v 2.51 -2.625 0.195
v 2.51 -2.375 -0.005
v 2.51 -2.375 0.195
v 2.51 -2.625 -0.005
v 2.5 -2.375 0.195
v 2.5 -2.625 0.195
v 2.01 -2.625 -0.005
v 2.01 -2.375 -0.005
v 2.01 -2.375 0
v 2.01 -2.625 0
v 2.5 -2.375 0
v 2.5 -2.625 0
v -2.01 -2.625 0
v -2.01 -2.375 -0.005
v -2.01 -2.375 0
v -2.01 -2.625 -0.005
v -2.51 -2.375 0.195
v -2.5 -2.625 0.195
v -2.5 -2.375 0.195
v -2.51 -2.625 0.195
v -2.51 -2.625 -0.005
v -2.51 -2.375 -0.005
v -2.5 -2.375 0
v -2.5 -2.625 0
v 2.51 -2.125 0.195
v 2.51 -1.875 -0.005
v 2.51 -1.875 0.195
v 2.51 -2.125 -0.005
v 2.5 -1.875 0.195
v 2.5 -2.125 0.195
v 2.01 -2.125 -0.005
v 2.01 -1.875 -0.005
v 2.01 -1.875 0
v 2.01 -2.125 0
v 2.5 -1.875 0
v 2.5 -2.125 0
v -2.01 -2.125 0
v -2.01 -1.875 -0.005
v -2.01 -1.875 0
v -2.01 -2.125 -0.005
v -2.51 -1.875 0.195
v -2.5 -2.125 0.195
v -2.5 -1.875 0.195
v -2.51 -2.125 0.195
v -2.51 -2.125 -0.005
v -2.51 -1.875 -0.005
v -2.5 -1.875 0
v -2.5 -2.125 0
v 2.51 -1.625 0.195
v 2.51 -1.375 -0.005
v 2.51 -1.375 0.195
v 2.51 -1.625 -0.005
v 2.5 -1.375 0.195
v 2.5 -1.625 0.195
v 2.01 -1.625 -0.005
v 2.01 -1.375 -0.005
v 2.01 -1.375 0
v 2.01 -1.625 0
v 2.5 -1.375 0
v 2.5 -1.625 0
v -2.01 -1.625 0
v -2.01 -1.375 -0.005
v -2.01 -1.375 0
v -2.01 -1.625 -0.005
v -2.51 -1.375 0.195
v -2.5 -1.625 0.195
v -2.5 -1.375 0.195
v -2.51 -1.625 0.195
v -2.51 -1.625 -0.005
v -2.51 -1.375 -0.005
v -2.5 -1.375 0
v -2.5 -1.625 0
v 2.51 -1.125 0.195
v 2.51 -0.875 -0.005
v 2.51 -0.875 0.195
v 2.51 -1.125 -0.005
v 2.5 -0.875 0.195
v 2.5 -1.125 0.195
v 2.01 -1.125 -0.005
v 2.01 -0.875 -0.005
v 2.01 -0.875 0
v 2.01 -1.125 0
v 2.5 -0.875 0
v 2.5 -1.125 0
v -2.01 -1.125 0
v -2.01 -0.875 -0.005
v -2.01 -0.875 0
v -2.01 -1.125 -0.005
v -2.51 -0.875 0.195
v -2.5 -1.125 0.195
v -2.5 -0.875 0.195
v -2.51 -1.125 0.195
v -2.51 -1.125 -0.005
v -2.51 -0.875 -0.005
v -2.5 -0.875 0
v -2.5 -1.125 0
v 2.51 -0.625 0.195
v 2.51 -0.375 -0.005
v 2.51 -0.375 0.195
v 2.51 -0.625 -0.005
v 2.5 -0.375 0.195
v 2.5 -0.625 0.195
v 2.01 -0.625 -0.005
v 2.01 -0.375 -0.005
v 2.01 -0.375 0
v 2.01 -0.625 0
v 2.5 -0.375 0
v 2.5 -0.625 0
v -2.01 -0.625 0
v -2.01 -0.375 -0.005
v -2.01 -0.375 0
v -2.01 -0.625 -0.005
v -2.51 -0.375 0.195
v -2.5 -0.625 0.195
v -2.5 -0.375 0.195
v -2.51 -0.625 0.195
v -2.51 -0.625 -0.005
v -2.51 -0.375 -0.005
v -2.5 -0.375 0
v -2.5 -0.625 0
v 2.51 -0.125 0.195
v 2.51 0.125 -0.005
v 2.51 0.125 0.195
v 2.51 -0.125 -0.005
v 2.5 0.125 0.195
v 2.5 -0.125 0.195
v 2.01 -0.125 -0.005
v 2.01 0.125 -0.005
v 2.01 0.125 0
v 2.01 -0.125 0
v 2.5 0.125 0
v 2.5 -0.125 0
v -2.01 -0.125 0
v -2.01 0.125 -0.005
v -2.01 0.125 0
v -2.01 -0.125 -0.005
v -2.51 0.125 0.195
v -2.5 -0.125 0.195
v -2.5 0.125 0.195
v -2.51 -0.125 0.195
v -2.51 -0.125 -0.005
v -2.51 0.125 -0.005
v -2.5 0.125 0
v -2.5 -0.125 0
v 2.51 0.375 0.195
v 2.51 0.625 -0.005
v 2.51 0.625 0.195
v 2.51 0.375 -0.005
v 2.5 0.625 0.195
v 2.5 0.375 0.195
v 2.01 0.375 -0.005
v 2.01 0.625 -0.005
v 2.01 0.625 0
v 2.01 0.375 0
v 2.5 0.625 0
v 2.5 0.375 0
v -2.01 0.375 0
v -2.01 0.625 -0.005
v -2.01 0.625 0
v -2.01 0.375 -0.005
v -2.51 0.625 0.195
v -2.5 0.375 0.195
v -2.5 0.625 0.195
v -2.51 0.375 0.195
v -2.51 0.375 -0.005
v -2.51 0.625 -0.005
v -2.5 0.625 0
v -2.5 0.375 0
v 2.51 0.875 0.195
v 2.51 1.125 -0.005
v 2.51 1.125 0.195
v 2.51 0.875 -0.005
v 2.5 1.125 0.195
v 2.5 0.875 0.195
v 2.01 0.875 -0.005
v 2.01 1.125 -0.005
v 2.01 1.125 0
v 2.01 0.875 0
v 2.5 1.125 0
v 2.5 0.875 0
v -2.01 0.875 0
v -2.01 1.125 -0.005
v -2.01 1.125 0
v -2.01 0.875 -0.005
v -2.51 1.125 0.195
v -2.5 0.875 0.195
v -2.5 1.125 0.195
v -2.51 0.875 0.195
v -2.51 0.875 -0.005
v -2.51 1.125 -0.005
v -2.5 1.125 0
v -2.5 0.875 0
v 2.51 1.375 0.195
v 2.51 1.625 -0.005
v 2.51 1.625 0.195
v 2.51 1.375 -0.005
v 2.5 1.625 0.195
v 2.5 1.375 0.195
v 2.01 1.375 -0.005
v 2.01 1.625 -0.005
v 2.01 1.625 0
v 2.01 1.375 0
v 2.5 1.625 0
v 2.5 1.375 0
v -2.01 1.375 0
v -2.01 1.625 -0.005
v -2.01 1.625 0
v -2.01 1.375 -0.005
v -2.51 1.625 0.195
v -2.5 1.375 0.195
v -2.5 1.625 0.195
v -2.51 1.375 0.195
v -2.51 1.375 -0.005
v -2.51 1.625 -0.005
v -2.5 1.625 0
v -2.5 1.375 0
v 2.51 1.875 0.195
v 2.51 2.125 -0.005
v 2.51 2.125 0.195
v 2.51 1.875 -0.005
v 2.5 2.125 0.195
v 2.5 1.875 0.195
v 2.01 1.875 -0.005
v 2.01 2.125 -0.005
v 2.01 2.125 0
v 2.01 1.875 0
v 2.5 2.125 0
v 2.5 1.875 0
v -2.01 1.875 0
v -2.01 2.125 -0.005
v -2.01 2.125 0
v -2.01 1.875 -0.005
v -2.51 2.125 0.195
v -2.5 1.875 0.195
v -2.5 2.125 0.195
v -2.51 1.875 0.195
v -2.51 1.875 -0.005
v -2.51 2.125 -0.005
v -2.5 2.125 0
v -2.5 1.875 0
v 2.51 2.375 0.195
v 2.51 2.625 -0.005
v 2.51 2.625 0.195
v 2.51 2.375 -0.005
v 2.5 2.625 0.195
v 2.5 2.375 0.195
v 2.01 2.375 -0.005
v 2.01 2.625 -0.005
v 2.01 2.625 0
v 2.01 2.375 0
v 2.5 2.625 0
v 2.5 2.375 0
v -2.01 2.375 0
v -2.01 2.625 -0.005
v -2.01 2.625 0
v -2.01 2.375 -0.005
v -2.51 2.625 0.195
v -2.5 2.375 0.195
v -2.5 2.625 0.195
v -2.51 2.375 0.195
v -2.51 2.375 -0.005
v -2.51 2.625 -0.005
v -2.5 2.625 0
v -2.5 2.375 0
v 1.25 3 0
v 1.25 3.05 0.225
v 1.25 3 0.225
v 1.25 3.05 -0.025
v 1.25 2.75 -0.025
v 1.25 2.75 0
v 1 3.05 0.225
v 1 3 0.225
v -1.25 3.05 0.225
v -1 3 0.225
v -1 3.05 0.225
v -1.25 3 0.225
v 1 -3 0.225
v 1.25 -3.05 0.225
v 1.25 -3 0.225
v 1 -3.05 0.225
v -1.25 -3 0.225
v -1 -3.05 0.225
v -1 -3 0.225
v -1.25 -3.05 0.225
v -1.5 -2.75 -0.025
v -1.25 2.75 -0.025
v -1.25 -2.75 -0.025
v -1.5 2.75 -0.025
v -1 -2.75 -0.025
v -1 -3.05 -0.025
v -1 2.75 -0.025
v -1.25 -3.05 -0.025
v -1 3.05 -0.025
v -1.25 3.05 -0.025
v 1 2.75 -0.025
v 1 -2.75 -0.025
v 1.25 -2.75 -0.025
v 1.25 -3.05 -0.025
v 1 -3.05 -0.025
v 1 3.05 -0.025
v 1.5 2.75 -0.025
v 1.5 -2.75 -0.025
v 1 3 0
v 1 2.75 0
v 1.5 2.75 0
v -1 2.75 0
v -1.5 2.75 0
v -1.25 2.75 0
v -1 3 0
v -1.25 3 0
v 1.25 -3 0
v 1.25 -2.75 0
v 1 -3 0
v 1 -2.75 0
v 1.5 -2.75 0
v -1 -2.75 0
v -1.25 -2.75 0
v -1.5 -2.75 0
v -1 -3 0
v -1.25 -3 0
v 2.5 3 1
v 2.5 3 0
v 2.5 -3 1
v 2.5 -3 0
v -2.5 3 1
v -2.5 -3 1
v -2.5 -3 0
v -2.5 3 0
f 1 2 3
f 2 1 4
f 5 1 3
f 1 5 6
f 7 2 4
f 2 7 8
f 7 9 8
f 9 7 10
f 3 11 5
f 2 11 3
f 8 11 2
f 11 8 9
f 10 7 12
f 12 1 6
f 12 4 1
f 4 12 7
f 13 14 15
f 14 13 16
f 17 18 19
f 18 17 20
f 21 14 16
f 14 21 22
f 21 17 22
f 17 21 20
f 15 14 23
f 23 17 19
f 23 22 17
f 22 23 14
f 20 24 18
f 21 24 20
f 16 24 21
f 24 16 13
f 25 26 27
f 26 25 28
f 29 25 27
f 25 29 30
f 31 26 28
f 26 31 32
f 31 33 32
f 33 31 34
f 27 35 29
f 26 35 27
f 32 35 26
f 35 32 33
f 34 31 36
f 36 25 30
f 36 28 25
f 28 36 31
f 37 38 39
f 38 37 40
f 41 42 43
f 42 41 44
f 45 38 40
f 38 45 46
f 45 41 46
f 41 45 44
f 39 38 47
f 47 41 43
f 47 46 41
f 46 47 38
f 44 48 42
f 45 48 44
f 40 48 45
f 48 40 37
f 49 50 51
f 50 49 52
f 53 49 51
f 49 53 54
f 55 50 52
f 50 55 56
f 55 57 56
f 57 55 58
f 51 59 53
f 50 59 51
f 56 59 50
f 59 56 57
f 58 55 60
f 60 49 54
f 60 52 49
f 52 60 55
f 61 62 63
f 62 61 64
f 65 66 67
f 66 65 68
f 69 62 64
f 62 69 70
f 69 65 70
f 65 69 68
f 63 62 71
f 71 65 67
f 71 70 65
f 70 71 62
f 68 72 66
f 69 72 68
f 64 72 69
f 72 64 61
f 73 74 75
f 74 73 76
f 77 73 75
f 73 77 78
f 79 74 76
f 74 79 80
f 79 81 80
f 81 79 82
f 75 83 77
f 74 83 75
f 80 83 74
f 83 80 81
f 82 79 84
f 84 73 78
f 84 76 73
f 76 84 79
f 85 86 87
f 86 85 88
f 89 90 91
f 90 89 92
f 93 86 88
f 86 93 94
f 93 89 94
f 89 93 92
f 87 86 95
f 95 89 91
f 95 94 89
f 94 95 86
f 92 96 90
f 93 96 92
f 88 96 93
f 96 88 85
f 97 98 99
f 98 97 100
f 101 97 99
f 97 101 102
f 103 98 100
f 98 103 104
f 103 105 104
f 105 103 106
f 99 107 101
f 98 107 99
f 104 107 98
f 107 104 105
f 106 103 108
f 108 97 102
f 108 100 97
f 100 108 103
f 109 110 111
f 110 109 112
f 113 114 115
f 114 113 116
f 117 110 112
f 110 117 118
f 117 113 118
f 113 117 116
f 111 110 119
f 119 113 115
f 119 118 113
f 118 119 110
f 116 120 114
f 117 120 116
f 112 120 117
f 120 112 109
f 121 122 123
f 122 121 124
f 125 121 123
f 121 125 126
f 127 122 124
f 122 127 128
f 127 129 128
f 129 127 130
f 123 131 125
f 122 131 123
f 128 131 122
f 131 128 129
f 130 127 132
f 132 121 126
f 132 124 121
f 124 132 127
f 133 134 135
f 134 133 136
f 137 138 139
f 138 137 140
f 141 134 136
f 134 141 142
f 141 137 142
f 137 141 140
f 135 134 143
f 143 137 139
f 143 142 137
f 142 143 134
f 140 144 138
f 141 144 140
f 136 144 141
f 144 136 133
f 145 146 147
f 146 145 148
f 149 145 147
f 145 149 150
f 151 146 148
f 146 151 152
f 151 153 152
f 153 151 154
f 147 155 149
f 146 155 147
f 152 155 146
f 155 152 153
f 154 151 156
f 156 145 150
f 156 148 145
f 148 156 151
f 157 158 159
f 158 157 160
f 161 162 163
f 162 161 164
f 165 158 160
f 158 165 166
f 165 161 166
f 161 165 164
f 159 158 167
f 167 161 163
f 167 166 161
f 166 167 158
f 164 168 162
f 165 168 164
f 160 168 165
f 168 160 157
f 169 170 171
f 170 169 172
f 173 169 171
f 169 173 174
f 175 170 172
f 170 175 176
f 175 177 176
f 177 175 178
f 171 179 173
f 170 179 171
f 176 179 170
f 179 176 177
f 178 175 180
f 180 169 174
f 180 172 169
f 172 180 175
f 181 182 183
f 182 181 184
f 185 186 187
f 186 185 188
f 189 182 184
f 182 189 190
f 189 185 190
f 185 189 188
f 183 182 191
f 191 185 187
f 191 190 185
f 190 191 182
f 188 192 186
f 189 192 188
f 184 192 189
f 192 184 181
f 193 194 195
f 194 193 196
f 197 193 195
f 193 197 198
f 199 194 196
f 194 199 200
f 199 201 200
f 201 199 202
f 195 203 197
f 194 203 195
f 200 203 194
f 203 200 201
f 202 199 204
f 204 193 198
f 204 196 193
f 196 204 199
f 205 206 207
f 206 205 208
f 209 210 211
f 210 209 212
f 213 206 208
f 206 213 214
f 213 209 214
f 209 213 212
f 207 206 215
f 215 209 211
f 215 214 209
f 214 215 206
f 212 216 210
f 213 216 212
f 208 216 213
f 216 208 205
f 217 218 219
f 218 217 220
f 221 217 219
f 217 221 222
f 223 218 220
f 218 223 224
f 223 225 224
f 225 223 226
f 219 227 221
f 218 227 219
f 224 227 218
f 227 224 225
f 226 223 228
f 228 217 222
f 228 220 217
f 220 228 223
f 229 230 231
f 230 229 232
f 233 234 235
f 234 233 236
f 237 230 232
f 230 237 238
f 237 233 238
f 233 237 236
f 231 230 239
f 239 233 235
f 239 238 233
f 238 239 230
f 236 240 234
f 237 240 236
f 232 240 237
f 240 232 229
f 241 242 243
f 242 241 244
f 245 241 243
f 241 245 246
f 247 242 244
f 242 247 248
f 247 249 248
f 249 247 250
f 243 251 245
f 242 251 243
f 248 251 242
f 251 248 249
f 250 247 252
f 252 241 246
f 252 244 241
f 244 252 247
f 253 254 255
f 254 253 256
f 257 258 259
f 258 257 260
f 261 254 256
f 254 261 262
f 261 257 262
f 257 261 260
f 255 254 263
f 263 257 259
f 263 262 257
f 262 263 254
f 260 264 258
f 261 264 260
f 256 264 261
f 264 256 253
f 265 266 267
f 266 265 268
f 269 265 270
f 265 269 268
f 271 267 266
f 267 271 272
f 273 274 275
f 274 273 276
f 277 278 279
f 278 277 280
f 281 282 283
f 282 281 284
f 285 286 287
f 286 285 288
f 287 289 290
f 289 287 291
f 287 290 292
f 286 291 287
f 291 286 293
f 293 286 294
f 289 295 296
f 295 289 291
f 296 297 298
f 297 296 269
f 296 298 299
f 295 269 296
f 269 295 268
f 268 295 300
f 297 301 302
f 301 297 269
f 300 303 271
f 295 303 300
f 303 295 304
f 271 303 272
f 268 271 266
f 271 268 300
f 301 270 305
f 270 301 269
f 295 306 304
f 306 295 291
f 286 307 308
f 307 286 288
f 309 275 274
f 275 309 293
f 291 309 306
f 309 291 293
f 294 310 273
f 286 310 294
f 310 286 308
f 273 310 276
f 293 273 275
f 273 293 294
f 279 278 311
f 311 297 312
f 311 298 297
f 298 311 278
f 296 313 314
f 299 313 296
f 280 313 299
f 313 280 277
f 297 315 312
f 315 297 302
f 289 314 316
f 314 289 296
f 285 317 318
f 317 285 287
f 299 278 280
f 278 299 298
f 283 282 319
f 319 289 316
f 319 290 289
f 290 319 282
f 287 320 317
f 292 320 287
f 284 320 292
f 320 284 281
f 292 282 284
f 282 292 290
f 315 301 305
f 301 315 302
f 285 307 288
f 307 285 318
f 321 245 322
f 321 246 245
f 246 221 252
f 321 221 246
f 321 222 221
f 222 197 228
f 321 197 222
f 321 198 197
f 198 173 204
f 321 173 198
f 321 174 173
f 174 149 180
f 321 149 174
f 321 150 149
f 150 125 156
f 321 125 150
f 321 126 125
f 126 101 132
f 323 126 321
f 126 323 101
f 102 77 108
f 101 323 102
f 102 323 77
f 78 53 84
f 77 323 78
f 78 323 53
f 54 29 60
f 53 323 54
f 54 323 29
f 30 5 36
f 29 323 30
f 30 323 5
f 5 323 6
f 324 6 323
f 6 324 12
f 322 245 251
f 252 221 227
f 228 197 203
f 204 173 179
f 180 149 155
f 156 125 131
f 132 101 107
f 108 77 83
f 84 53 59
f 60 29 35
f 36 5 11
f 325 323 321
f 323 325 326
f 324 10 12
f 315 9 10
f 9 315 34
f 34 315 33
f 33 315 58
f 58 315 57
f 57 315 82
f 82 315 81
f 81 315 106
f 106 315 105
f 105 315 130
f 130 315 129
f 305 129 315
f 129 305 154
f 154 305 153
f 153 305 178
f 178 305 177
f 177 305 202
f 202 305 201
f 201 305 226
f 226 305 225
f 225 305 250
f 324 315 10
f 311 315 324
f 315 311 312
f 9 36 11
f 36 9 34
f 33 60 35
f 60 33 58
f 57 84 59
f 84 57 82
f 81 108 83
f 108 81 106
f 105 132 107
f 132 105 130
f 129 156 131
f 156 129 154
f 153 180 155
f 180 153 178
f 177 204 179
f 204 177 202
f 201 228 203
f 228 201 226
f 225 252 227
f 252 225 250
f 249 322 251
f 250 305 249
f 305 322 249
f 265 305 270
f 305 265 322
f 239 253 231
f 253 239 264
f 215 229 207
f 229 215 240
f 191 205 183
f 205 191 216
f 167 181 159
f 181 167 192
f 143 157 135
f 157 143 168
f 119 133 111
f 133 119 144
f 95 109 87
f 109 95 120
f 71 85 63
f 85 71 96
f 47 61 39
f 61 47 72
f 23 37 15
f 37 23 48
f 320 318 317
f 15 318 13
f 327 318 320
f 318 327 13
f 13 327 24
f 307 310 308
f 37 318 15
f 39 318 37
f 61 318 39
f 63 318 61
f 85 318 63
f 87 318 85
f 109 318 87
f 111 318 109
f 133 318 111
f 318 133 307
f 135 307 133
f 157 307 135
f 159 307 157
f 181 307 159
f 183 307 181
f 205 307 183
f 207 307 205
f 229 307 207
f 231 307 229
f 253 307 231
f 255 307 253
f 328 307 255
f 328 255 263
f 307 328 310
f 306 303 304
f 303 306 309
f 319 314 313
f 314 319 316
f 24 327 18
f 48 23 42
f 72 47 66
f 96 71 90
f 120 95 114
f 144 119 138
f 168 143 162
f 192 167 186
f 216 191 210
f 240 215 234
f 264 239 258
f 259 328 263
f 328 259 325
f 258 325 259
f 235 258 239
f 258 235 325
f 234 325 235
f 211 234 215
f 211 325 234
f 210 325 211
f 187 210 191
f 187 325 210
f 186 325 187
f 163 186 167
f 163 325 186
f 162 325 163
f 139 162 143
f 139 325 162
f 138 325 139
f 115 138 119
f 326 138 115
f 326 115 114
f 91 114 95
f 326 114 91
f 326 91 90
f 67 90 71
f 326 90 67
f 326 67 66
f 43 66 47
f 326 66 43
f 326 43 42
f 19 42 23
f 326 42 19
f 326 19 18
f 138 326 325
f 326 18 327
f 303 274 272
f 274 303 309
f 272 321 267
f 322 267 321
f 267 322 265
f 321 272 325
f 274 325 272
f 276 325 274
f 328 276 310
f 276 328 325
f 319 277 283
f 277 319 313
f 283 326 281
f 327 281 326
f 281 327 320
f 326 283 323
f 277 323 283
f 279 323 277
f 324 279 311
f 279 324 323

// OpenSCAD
$fn=50;

color("#505050") translate([0,0,0.5]) cube([5,6,1], center=true);

color("lightgray") union() {
    for (i=[-5:5]) {
        translate([5/2-0.24, i*0.5, 0.095]) cube([0.5, 0.25, 0.2], center=true);
        translate([-5/2+0.24, i*0.5, 0.095]) cube([0.5, 0.25, 0.2], center=true);
    }
    
    translate([1+0.25/2, 3-0.10, 0.1]) cube([0.25, 0.3, 0.25], center=true);
    translate([-(1+0.25/2), 3-0.10, 0.1]) cube([0.25, 0.3, 0.25], center=true);

    translate([1+0.25/2, -(3-0.10), 0.1]) cube([0.25, 0.3, 0.25], center=true);
    translate([-(1+0.25/2), -(3-0.10), 0.1]) cube([0.25, 0.3, 0.25], center=true);

    translate([0, 0, 0.1]) cube([3, 5.5, 0.25], center=true);    
}
